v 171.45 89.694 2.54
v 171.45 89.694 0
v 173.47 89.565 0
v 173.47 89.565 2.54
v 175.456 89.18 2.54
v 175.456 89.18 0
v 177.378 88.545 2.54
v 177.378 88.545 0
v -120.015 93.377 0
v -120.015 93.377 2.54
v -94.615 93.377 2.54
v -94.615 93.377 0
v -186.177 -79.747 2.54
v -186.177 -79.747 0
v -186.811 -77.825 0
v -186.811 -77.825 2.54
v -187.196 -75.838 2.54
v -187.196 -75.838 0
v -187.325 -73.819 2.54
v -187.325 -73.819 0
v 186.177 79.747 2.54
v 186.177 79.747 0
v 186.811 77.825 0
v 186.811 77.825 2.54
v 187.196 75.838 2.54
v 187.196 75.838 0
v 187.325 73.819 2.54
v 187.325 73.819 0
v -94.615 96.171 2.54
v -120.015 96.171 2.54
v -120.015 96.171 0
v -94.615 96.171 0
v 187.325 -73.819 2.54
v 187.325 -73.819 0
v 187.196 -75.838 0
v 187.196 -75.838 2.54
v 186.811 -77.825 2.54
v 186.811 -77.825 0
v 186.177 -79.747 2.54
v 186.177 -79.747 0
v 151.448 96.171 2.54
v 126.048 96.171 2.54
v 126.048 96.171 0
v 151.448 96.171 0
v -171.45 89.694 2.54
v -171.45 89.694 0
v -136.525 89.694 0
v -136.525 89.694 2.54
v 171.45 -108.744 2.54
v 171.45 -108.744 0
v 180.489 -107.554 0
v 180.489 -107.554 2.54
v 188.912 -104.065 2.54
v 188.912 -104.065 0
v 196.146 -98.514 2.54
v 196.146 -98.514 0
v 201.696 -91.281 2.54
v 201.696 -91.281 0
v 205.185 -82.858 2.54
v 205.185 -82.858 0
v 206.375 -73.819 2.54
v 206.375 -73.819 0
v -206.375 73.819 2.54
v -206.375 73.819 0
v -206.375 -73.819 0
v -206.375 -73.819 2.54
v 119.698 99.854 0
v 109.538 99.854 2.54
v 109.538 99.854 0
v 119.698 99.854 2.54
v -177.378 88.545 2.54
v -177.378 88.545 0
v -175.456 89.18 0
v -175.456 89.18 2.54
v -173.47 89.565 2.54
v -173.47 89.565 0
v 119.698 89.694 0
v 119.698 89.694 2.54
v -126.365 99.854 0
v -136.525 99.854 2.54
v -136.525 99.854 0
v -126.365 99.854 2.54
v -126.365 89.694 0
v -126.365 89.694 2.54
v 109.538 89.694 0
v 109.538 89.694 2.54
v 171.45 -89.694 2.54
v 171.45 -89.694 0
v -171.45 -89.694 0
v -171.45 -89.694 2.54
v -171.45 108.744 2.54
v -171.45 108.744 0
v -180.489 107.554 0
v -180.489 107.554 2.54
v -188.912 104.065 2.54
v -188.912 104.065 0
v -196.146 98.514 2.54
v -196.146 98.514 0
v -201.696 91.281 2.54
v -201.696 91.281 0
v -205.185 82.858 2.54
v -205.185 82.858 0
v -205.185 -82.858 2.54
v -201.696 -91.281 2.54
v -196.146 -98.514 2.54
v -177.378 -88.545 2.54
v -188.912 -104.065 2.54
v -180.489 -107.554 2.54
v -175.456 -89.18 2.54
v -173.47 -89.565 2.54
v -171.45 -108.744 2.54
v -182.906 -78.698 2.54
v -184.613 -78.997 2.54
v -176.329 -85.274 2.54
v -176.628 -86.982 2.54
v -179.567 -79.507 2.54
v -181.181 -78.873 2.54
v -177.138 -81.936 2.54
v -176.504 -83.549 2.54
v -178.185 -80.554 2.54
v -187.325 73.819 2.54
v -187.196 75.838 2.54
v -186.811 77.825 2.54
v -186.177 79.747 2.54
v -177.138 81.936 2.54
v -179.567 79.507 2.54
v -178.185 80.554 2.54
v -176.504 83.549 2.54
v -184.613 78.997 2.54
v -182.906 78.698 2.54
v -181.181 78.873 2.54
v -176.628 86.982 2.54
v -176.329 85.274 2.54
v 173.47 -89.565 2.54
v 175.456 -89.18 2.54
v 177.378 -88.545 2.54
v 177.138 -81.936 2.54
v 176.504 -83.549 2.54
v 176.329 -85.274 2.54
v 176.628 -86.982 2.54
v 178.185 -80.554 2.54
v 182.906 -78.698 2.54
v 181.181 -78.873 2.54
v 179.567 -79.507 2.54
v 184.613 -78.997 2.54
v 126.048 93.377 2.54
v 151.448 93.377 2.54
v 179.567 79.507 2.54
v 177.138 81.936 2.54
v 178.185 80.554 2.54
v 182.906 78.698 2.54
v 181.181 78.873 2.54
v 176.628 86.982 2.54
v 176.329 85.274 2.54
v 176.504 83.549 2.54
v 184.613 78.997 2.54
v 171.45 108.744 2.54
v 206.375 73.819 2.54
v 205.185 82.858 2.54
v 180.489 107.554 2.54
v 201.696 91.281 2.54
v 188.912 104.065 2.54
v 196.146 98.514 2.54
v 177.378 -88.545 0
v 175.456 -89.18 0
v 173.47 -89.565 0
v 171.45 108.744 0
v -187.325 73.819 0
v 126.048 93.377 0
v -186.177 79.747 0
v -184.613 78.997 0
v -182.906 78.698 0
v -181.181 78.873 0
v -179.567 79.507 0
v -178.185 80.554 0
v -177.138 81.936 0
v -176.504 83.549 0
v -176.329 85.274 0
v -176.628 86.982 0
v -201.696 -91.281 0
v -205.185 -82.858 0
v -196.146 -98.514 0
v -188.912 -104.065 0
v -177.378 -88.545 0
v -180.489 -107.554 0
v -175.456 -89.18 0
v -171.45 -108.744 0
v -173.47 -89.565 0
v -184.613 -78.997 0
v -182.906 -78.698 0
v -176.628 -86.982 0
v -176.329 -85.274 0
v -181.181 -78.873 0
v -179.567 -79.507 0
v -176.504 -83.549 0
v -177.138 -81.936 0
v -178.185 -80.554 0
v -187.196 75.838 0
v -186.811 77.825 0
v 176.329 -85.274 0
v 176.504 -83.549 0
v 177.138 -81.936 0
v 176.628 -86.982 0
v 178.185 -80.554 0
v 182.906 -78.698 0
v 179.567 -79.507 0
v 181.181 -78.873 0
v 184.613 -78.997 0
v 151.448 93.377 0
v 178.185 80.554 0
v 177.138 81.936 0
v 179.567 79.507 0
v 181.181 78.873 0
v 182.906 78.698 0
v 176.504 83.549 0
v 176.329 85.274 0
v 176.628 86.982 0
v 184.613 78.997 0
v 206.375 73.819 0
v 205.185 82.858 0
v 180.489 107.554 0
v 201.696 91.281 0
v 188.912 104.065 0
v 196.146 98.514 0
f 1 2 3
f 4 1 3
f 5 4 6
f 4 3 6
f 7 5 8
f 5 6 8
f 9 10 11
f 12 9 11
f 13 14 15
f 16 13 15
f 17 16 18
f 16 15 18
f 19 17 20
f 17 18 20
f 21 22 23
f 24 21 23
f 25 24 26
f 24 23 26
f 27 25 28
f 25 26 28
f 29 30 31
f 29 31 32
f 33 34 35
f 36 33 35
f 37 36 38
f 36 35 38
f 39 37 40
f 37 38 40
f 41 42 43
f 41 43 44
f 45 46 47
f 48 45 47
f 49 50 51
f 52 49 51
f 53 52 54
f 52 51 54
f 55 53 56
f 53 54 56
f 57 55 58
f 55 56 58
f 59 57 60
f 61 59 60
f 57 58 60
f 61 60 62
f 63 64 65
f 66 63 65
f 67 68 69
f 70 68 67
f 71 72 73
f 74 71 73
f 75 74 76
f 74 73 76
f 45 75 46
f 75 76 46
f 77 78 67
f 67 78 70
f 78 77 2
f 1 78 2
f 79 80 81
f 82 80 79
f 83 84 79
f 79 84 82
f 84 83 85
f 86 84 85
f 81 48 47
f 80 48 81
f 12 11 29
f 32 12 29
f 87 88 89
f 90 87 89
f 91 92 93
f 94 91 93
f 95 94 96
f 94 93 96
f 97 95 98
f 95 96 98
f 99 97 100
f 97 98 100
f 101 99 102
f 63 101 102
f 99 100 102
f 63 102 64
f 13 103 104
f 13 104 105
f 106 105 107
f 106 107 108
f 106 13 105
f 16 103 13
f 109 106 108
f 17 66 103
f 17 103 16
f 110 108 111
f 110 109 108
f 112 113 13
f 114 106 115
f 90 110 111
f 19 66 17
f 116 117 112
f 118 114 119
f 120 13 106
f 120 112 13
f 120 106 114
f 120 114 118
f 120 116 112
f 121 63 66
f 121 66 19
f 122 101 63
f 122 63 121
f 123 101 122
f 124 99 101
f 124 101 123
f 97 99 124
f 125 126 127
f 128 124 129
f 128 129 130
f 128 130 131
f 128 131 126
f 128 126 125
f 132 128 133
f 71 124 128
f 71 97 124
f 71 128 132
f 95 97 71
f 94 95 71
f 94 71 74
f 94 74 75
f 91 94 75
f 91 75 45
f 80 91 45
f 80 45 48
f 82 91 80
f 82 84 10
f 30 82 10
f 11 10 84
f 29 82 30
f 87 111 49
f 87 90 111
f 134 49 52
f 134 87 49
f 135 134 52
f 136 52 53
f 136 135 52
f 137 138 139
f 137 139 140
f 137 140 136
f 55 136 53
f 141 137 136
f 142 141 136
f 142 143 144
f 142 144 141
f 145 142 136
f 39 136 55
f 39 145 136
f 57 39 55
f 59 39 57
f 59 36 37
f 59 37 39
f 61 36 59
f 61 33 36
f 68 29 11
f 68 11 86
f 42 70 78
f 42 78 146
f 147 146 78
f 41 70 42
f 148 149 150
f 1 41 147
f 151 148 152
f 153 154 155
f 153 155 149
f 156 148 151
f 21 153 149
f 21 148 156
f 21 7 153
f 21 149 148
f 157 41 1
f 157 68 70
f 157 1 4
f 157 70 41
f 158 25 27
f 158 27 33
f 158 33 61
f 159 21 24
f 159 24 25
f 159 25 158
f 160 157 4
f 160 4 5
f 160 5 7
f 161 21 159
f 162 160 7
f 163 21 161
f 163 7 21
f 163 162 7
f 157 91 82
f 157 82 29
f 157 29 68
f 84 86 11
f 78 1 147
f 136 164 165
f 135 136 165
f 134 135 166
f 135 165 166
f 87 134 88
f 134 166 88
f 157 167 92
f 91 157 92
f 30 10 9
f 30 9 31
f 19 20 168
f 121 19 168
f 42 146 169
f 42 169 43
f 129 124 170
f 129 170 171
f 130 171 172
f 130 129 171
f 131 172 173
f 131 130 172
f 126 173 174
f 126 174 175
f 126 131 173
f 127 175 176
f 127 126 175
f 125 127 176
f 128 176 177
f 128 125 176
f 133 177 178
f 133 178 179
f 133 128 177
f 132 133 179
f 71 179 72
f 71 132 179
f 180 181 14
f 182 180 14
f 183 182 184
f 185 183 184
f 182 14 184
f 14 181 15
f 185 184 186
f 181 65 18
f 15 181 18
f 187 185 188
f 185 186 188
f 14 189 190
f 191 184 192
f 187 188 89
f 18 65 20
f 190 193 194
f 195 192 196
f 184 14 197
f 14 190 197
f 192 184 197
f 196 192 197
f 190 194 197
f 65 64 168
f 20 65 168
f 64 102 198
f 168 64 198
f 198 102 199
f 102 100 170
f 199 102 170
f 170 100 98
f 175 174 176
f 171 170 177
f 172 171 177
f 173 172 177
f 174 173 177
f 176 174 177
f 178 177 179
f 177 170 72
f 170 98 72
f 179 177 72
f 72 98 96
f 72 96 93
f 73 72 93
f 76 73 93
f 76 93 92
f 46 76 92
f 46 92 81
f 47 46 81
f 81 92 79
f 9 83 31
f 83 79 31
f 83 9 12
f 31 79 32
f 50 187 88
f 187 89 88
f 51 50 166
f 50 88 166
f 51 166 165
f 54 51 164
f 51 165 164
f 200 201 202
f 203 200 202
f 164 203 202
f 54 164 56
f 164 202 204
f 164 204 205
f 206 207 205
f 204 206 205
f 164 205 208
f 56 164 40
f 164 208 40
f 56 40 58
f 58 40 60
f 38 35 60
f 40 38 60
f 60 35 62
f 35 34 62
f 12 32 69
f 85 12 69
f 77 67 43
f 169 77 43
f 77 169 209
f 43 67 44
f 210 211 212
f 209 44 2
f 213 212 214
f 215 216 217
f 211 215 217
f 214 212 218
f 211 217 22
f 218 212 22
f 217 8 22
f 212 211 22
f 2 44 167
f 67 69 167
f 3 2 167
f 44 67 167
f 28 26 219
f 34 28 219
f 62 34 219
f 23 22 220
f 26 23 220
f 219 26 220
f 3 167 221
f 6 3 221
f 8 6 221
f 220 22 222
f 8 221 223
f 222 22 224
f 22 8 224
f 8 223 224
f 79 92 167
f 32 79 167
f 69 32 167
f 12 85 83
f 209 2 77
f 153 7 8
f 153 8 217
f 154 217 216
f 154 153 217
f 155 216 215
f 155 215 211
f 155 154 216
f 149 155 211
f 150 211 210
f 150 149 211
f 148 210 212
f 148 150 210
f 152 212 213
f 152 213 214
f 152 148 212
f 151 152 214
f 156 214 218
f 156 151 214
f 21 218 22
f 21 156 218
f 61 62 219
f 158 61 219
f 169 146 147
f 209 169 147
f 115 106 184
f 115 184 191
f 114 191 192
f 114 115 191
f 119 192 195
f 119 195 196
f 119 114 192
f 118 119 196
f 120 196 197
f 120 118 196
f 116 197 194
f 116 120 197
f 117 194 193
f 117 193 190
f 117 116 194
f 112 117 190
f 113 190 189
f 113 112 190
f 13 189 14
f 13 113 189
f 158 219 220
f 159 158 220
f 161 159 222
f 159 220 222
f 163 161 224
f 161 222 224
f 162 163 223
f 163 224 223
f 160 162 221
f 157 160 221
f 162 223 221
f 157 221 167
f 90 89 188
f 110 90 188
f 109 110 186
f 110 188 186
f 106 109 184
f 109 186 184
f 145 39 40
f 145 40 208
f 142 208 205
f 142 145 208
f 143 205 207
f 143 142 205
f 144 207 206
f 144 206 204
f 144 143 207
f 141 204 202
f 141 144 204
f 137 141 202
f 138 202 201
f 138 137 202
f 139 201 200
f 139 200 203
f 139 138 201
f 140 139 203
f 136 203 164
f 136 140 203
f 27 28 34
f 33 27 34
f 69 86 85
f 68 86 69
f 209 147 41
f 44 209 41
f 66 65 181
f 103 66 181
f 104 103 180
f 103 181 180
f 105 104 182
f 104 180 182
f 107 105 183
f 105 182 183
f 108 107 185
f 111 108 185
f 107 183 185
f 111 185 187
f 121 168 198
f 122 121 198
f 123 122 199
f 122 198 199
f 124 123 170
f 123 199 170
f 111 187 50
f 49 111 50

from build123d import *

# Parameters (mm, degrees)
F1_DEPTH = 2.54
F2_W     = 10.16
F2_H     = 10.16
F3_DEPTH = 2.54
F5_DEPTH = 2.54
F6_W     = 25.4
F6_H     = 2.794
F7_DEPTH = 25.4


with BuildPart() as f1:
    # F0 (on Top) → F1 (new body)
    with BuildSketch(Plane.XY):
        with BuildLine():
            Line((206.375, -73.81875), (206.375, 73.81875))
            ThreePointArc((206.375, 73.81875), (196.145704, 98.514454), (171.45, 108.74375))
            Line((171.45, 108.74375), (-171.45, 108.74375))
            ThreePointArc((-171.45, 108.74375), (-196.145704, 98.514454), (-206.375, 73.81875))
            Line((-206.375, 73.81875), (-206.375, -73.81875))
            ThreePointArc((-206.375, -73.81875), (-196.145704, -98.514454), (-171.45, -108.74375))
            Line((-171.45, -108.74375), (171.45, -108.74375))
            ThreePointArc((171.45, -108.74375), (196.145704, -98.514454), (206.375, -73.81875))
        make_face()
        with BuildLine():
            ThreePointArc((187.325, -73.81875), (182.67532, -85.04407), (171.45, -89.69375))
            Line((171.45, -89.69375), (-171.45, -89.69375))
            ThreePointArc((-171.45, -89.69375), (-182.67532, -85.04407), (-187.325, -73.81875))
            Line((-187.325, -73.81875), (-187.325, 73.81875))
            ThreePointArc((-187.325, 73.81875), (-182.67532, 85.04407), (-171.45, 89.69375))
            Line((-171.45, 89.69375), (171.45, 89.69375))
            ThreePointArc((171.45, 89.69375), (182.67532, 85.04407), (187.325, 73.81875))
            Line((187.325, 73.81875), (187.325, -73.81875))
        make_face(mode=Mode.SUBTRACT)
    extrude(amount=F1_DEPTH)

    # F2 (on face) → F3 (cut, through all)
    with BuildSketch(Plane.XY.offset(2.54)):
        with Locations((-131.445, 94.77375)):
            Rectangle(F2_W, F2_H)
        with Locations((114.6175, 94.77375)):
            Rectangle(F2_W, F2_H)
    extrude(amount=-F3_DEPTH, mode=Mode.SUBTRACT)

    # F4 (on face) → F5 (join, through all)
    with BuildSketch(Plane.XY.offset(2.54)):
        with BuildLine():
            ThreePointArc((-186.176704, 79.746635), (-178.185192, 80.553942), (-177.377885, 88.545454))
            ThreePointArc((-177.377885, 88.545454), (-182.67532, 85.04407), (-186.176704, 79.746635))
        make_face()
        with BuildLine():
            ThreePointArc((186.176704, 79.746635), (182.67532, 85.04407), (177.377885, 88.545454))
            ThreePointArc((177.377885, 88.545454), (178.185192, 80.553942), (186.176704, 79.746635))
        make_face()
        with BuildLine():
            ThreePointArc((186.176704, -79.746635), (178.185192, -80.553942), (177.377885, -88.545454))
            ThreePointArc((177.377885, -88.545454), (182.67532, -85.04407), (186.176704, -79.746635))
        make_face()
        with BuildLine():
            ThreePointArc((-177.377885, -88.545454), (-178.185192, -80.553942), (-186.176704, -79.746635))
            ThreePointArc((-186.176704, -79.746635), (-182.67532, -85.04407), (-177.377885, -88.545454))
        make_face()
    extrude(amount=-F5_DEPTH)

    # F6 (on face) → F7 (cut)
    with BuildSketch(Plane.XY.offset(2.54)):
        with Locations((-107.315, 94.77375)):
            Rectangle(F6_W, F6_H)
        with Locations((138.7475, 94.77375)):
            Rectangle(F6_W, F6_H)
    extrude(amount=-F7_DEPTH, mode=Mode.SUBTRACT)


solid = f1.part
